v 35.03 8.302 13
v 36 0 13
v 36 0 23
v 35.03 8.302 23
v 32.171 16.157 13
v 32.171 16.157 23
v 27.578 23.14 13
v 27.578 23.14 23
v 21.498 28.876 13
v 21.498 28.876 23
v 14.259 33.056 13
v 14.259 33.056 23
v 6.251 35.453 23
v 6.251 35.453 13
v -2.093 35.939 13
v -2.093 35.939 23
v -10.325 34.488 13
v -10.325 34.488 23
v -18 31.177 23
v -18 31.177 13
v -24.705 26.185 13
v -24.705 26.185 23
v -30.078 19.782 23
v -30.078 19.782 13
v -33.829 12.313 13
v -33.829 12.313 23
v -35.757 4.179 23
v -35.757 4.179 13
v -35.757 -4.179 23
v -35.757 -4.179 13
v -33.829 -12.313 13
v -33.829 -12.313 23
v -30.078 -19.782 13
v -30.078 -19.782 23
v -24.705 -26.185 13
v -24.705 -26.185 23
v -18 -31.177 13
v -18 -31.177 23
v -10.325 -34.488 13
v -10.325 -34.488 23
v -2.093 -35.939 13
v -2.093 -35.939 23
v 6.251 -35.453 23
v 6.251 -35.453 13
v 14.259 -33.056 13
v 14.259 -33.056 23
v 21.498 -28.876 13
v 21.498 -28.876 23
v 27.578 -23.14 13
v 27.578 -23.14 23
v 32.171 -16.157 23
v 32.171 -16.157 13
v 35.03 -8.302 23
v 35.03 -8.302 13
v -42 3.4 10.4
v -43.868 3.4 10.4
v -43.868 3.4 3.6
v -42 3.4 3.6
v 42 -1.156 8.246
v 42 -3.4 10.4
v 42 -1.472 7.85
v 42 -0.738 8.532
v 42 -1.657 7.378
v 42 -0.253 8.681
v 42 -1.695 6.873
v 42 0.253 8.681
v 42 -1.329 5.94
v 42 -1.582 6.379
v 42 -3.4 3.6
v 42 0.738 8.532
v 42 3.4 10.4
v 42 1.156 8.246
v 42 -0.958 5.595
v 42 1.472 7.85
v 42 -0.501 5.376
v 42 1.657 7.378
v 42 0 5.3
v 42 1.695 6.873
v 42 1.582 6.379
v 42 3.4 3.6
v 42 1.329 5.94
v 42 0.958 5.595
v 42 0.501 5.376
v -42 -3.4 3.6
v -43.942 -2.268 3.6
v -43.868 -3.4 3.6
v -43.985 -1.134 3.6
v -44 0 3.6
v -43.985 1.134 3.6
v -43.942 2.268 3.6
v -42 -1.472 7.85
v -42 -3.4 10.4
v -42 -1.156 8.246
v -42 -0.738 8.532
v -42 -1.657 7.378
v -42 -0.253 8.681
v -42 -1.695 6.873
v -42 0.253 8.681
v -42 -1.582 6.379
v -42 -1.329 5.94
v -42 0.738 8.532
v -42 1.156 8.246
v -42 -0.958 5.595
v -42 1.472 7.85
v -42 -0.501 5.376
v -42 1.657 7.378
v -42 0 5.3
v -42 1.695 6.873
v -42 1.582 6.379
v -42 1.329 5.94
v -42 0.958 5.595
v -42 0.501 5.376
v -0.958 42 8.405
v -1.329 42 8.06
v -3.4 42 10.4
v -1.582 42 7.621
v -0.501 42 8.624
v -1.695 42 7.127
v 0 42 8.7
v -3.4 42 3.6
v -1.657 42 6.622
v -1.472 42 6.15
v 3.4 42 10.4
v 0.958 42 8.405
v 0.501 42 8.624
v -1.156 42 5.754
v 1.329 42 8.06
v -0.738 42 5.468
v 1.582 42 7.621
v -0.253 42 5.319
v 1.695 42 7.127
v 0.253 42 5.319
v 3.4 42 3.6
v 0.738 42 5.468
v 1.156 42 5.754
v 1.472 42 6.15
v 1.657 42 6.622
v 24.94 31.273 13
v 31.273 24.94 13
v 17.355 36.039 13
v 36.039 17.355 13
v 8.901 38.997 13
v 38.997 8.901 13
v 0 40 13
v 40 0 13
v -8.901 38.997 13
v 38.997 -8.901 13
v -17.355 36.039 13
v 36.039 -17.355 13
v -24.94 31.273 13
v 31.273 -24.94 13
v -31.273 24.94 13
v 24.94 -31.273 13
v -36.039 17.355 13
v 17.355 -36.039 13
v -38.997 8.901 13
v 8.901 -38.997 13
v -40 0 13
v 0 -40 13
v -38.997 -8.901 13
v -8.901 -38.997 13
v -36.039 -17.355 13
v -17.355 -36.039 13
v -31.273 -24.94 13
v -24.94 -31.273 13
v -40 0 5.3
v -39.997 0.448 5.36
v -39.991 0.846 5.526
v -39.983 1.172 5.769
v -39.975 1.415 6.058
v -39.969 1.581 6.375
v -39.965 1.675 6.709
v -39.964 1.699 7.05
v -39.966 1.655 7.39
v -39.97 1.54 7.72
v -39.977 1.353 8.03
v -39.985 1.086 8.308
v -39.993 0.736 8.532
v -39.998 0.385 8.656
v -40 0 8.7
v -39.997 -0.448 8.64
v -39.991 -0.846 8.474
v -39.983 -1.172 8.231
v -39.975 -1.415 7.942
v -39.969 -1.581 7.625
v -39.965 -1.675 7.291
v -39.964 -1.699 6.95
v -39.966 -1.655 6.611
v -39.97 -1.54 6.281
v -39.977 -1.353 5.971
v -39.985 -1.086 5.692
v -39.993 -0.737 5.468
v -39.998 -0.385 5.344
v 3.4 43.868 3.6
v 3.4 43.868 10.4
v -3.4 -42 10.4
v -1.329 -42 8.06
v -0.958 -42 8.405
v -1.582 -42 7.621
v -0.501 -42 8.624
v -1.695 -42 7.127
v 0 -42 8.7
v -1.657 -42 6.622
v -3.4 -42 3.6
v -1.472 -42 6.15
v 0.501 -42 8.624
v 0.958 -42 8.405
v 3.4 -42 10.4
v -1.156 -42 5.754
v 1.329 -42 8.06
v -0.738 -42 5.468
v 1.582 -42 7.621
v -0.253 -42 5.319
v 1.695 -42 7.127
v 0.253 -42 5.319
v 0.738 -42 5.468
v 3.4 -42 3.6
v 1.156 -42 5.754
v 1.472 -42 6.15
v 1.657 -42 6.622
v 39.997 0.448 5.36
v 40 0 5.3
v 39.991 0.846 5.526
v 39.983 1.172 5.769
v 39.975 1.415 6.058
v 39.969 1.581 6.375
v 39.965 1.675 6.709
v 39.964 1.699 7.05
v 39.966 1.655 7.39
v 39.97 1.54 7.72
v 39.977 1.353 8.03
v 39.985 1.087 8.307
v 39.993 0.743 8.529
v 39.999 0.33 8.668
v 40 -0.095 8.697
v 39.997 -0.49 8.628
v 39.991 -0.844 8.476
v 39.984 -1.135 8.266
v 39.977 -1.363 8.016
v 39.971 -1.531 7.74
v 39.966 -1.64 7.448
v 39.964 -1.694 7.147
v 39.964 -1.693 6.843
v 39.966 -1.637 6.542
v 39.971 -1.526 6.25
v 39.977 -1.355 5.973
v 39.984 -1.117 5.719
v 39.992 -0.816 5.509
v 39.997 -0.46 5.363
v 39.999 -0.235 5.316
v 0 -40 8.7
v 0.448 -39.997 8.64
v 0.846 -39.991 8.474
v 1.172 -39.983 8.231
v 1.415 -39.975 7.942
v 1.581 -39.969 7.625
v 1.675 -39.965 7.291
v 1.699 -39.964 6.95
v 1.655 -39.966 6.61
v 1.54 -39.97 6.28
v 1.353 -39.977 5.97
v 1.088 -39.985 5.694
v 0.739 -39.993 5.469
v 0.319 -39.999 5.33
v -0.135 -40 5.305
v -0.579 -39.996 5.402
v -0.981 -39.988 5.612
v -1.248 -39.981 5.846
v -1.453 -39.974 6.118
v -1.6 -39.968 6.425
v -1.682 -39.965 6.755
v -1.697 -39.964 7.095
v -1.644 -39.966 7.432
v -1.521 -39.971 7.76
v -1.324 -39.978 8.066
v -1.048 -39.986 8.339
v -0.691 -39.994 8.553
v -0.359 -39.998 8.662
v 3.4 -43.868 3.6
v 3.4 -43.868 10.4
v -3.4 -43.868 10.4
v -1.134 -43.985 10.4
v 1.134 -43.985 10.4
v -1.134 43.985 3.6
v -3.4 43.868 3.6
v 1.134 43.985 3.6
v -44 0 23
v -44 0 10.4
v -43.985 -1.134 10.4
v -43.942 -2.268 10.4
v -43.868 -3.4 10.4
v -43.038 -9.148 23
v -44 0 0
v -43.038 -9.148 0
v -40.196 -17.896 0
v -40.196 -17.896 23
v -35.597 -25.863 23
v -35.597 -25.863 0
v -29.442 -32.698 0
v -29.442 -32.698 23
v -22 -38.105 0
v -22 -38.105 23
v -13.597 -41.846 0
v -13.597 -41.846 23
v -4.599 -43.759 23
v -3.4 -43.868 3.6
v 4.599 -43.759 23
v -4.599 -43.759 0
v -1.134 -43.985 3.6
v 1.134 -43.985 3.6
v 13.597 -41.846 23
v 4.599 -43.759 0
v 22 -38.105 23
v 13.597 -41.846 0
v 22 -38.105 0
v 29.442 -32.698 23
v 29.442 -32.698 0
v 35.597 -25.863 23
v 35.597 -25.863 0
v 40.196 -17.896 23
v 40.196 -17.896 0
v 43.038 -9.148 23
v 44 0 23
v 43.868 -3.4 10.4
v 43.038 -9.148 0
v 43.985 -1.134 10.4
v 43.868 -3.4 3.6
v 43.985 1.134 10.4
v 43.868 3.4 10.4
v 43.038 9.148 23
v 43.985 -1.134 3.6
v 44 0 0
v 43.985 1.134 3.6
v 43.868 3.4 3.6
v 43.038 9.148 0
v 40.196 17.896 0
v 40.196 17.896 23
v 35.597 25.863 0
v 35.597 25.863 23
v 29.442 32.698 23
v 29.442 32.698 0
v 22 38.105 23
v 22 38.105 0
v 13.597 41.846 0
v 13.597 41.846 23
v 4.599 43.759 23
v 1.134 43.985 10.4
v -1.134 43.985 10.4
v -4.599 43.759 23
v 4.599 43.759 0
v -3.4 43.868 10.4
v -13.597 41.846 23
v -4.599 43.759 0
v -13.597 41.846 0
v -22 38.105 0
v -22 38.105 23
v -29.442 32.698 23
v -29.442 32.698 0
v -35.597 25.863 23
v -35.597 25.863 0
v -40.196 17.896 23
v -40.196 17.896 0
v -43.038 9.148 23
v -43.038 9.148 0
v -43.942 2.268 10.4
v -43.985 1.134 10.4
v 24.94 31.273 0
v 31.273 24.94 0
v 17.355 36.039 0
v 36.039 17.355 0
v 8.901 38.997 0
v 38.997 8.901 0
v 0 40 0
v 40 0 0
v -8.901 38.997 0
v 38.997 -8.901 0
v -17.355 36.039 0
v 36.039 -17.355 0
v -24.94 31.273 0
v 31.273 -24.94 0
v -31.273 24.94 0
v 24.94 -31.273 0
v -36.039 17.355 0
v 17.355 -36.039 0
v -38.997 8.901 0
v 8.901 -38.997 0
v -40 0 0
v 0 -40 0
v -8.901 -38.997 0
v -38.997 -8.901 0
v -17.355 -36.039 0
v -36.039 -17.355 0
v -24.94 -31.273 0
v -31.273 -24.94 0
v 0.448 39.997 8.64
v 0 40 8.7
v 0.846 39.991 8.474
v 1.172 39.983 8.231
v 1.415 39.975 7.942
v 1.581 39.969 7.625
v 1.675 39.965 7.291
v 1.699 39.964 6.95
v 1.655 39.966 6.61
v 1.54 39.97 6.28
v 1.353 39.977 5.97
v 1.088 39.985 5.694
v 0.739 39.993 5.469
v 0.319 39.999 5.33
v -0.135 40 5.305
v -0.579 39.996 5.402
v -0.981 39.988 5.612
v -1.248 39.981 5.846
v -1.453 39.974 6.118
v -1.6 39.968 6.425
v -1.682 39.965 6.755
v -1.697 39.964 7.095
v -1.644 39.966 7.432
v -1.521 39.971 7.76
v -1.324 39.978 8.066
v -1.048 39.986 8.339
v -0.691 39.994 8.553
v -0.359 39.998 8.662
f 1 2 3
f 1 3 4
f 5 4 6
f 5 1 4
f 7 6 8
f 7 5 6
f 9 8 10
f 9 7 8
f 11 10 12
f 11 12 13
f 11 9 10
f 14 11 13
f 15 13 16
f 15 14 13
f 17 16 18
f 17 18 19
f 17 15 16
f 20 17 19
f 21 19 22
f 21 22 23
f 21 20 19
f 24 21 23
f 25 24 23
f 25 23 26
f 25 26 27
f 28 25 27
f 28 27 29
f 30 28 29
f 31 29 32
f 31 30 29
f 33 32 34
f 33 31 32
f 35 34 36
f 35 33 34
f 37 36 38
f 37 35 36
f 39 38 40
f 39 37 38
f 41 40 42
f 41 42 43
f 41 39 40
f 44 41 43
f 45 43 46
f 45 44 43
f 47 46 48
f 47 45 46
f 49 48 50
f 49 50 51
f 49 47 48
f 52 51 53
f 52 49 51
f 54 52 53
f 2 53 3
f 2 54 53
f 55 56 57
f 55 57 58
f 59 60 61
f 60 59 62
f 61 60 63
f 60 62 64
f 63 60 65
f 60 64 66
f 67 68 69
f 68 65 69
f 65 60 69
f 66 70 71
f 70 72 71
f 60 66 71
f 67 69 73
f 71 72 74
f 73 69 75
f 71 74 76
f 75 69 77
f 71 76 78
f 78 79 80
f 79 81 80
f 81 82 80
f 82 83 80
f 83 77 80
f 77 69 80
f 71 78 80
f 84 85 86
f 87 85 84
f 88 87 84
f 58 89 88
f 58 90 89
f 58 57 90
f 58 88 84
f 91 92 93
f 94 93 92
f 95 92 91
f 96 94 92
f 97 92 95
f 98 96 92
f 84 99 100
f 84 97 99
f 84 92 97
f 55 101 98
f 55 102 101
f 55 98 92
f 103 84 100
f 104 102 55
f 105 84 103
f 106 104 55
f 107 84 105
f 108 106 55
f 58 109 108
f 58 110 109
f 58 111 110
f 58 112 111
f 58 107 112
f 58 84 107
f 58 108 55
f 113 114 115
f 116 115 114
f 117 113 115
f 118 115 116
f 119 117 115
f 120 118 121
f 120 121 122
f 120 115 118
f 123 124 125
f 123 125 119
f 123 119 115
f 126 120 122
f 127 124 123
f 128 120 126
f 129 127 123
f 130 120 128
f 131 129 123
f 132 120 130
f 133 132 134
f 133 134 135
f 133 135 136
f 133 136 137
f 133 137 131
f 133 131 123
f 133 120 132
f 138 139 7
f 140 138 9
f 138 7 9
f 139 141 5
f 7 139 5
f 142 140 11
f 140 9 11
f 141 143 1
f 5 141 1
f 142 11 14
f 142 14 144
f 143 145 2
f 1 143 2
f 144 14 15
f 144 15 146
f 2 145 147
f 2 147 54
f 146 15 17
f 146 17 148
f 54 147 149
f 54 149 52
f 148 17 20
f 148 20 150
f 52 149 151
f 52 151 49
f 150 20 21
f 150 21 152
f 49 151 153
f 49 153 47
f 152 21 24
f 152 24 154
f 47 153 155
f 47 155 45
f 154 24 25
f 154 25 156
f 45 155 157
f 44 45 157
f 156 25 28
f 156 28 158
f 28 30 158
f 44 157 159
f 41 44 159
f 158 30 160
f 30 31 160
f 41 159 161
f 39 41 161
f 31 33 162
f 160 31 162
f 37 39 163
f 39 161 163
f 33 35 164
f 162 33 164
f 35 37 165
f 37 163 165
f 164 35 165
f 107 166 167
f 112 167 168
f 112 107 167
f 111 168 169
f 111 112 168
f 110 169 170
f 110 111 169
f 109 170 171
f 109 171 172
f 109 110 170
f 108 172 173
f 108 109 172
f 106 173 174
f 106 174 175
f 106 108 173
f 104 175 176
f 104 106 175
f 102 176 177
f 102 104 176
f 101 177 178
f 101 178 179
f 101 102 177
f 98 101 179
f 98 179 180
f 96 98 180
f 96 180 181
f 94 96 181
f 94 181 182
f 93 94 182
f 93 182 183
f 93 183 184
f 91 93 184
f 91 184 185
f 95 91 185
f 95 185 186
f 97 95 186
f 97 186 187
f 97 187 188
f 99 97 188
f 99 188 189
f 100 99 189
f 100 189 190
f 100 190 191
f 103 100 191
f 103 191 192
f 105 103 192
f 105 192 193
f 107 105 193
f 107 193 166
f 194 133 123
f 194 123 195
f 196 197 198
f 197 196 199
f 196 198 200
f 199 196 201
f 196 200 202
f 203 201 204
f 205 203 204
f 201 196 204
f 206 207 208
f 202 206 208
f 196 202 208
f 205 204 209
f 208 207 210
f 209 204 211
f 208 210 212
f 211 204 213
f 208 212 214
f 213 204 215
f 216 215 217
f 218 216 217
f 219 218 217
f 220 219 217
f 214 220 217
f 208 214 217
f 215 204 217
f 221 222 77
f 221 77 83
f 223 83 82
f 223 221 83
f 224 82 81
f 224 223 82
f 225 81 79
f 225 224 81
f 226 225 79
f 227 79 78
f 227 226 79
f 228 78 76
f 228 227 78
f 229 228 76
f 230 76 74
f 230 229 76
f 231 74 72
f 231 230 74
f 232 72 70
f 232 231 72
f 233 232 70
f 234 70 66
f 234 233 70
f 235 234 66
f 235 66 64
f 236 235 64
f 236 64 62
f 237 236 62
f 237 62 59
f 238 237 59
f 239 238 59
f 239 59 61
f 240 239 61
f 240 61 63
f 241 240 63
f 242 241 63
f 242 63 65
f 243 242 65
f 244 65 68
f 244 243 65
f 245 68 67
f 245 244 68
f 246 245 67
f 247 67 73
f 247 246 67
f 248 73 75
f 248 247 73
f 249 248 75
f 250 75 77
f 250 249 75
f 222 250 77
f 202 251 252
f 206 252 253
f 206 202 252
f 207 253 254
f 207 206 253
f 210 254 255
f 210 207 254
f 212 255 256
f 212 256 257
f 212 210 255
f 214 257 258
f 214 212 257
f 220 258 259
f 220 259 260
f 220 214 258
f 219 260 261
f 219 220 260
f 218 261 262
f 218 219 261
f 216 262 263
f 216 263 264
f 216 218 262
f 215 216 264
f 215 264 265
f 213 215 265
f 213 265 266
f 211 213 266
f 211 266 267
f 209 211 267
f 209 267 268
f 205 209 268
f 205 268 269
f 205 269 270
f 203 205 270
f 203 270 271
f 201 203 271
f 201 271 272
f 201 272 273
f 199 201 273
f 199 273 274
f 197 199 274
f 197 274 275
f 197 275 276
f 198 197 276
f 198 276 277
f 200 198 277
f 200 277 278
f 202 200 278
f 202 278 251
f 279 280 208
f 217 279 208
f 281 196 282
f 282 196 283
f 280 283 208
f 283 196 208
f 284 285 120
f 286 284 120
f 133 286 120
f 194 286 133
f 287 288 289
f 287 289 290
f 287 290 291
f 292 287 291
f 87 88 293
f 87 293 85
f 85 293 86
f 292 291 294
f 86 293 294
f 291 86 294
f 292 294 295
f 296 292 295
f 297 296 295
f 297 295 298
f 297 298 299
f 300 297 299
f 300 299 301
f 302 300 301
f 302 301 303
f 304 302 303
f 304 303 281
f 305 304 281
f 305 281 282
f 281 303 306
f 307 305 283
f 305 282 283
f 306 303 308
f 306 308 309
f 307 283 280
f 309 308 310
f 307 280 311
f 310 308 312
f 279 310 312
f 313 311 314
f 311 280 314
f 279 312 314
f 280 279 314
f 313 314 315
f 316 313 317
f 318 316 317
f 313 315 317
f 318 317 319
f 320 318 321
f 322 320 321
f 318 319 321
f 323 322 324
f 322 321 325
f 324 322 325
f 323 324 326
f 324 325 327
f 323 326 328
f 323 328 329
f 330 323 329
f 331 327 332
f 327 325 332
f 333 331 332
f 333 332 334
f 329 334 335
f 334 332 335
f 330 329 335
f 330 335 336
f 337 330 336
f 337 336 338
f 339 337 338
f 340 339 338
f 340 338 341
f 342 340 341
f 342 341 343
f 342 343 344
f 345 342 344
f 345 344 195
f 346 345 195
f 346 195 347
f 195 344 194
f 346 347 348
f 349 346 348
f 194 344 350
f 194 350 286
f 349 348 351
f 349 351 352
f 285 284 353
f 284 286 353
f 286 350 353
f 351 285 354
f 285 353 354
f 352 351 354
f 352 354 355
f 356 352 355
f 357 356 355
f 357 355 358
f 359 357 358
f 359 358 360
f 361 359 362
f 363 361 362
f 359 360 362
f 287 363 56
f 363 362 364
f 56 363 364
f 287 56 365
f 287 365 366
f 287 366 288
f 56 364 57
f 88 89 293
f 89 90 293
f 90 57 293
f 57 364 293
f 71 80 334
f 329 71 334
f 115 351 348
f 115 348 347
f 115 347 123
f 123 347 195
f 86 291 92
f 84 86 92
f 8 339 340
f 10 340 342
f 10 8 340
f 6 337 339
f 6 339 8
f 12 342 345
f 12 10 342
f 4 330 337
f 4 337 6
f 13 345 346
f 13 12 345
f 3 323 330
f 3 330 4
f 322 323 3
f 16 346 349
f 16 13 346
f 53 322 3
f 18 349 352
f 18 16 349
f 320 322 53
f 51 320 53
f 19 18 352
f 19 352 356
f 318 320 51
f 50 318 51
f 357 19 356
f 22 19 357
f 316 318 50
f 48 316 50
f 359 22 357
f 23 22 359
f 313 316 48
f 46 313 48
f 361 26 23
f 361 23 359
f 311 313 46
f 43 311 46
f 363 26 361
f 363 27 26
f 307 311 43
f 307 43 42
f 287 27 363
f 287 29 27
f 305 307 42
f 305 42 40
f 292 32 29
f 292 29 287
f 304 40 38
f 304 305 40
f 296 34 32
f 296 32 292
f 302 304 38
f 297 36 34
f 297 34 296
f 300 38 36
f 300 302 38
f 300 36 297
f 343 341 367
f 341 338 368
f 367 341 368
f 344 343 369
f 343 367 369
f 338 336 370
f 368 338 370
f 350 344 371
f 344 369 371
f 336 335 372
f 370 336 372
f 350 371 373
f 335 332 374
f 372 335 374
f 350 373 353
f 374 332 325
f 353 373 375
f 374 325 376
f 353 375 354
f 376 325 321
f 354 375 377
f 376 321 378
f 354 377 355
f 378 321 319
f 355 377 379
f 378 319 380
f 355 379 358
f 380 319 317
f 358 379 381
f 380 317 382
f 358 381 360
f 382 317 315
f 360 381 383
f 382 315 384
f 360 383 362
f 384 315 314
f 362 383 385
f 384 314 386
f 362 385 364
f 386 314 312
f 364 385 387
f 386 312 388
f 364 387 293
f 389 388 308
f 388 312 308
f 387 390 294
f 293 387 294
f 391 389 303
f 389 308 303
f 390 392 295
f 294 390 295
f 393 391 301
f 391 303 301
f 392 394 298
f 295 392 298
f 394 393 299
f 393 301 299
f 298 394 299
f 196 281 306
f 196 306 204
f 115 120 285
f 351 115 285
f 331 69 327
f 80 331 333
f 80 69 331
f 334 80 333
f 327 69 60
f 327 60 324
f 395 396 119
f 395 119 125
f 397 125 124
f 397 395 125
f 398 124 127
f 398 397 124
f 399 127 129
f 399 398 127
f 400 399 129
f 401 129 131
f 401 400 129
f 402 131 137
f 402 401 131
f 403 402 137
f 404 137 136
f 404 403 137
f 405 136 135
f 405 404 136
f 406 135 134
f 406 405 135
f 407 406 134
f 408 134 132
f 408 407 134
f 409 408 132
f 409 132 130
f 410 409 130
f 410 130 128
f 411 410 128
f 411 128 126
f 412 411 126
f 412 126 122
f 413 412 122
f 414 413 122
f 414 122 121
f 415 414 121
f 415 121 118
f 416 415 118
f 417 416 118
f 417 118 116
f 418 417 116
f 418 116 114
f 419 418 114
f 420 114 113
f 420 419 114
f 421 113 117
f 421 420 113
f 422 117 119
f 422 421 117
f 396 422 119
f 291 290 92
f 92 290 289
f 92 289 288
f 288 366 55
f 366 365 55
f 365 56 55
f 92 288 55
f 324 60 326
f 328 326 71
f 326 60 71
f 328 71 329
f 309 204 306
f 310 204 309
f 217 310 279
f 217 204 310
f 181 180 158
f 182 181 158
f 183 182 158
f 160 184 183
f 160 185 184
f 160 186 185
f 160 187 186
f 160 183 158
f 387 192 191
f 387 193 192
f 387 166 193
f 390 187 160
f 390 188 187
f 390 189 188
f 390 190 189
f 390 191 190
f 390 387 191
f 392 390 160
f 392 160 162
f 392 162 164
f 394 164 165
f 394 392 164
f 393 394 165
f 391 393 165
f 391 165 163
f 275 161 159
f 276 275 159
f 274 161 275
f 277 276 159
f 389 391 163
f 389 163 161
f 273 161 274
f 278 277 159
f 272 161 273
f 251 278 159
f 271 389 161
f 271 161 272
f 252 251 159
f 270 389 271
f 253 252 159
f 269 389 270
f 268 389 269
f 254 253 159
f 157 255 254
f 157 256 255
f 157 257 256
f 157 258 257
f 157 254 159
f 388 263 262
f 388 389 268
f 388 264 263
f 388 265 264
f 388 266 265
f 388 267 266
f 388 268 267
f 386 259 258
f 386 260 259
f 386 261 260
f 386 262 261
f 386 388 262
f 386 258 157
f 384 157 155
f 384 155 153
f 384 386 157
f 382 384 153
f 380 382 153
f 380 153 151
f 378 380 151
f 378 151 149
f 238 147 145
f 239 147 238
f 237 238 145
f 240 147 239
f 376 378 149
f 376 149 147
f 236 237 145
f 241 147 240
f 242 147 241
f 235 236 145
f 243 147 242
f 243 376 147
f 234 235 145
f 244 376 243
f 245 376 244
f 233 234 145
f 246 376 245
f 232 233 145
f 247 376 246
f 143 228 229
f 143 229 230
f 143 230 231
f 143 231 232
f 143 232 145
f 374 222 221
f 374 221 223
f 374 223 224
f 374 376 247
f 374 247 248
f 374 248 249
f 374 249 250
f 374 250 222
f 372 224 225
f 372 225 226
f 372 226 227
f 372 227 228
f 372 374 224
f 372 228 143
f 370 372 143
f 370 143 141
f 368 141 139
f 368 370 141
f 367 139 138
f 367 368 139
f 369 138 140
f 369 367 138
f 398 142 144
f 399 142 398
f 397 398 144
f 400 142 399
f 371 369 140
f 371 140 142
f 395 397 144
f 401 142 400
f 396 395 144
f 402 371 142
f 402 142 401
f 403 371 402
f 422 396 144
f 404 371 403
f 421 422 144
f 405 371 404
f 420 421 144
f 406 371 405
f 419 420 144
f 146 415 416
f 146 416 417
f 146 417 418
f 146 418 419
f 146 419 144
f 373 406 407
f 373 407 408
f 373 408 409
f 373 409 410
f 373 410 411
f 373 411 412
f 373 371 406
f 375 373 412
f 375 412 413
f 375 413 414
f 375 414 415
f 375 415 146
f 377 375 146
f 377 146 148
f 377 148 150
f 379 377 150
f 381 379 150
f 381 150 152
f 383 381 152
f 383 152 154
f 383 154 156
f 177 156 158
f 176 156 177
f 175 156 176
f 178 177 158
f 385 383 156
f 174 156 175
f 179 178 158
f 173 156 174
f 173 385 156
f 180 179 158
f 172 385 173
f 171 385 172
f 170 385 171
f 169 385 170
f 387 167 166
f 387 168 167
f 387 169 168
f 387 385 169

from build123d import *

# Parameters (mm, degrees)
CROQUIS1_R                        = 44
CROQUIS1_R_2                      = 40
MANGA_DEPTH                       = 13
CROQUIS2_R                        = 44
CROQUIS2_R_2                      = 36
LABIO_DEPTH                       = 10
PASANTES_M3_RADIALES_A_DEPTH      = 67.340033162
PASANTES_M3_RADIALES_A_DEPTH_BACK = 67.340033162
CROQUIS3_R                        = 1.7
PASANTES_M3_RADIALES_B_DEPTH      = 67.340033339
PASANTES_M3_RADIALES_B_DEPTH_BACK = 67.340033339
CROQUIS4_R                        = 1.7
CROQUIS10_W                       = 3.5
CROQUIS10_H                       = 6.8
CROQUIS10_W_2                     = 6.8
CROQUIS10_H_2                     = 3.5
PLANOS_M3_TORNILLOS_DEPTH         = 6.8


with BuildPart() as part:
    # Croquis1 → Manga (new body)
    with BuildSketch(Plane.XY):
        with Locations(Location((0, 0, 0), (0, 0, 180))):
            Circle(CROQUIS1_R)
        with Locations(Location((0, 0, 0), (0, 0, 180))):
            Circle(CROQUIS1_R_2, mode=Mode.SUBTRACT)
    extrude(amount=MANGA_DEPTH)

    # Croquis2 → Labio (add)
    with BuildSketch(Plane.XY.offset(13)):
        with Locations(Location((0, 0, 0), (0, 0, 180))):
            Circle(CROQUIS2_R)
        Circle(CROQUIS2_R_2, mode=Mode.SUBTRACT)
    extrude(amount=LABIO_DEPTH)

    # Croquis3 → Pasantes_M3_radiales_A (cut, two sides: drawn at the far end of the back side and taken through both)
    with BuildSketch(Plane(origin=(0, 0, 0), x_dir=(1, 0, 0), z_dir=(0, 1, 0)).offset(-PASANTES_M3_RADIALES_A_DEPTH_BACK)):
        with Locations(Location((0, -7, 0), (0, 0, 270))):
            Circle(CROQUIS3_R)
    extrude(amount=PASANTES_M3_RADIALES_A_DEPTH + PASANTES_M3_RADIALES_A_DEPTH_BACK, mode=Mode.SUBTRACT)

    # Croquis4 → Pasantes_M3_radiales_B (cut, two sides: drawn at the far end of the back side and taken through both)
    with BuildSketch(Plane(origin=(0, 0, 0), x_dir=(0, 0, -1), z_dir=(1, 0, 0)).offset(-PASANTES_M3_RADIALES_B_DEPTH_BACK)):
        with Locations((-7, 0)):
            Circle(CROQUIS4_R)
    extrude(amount=PASANTES_M3_RADIALES_B_DEPTH + PASANTES_M3_RADIALES_B_DEPTH_BACK, mode=Mode.SUBTRACT)

    # Croquis10 → Planos_M3_tornillos (cut)
    with BuildSketch(Plane.XY.offset(3.6)):
        with Locations((43.75, 0)):
            Rectangle(CROQUIS10_W, CROQUIS10_H)
        with Locations((0, 43.75)):
            Rectangle(CROQUIS10_W_2, CROQUIS10_H_2)
        with Locations((-43.75, 0)):
            Rectangle(CROQUIS10_W, CROQUIS10_H)
        with Locations((0, -43.75)):
            Rectangle(CROQUIS10_W_2, CROQUIS10_H_2)
    extrude(amount=PLANOS_M3_TORNILLOS_DEPTH, mode=Mode.SUBTRACT)


solid = part.part
